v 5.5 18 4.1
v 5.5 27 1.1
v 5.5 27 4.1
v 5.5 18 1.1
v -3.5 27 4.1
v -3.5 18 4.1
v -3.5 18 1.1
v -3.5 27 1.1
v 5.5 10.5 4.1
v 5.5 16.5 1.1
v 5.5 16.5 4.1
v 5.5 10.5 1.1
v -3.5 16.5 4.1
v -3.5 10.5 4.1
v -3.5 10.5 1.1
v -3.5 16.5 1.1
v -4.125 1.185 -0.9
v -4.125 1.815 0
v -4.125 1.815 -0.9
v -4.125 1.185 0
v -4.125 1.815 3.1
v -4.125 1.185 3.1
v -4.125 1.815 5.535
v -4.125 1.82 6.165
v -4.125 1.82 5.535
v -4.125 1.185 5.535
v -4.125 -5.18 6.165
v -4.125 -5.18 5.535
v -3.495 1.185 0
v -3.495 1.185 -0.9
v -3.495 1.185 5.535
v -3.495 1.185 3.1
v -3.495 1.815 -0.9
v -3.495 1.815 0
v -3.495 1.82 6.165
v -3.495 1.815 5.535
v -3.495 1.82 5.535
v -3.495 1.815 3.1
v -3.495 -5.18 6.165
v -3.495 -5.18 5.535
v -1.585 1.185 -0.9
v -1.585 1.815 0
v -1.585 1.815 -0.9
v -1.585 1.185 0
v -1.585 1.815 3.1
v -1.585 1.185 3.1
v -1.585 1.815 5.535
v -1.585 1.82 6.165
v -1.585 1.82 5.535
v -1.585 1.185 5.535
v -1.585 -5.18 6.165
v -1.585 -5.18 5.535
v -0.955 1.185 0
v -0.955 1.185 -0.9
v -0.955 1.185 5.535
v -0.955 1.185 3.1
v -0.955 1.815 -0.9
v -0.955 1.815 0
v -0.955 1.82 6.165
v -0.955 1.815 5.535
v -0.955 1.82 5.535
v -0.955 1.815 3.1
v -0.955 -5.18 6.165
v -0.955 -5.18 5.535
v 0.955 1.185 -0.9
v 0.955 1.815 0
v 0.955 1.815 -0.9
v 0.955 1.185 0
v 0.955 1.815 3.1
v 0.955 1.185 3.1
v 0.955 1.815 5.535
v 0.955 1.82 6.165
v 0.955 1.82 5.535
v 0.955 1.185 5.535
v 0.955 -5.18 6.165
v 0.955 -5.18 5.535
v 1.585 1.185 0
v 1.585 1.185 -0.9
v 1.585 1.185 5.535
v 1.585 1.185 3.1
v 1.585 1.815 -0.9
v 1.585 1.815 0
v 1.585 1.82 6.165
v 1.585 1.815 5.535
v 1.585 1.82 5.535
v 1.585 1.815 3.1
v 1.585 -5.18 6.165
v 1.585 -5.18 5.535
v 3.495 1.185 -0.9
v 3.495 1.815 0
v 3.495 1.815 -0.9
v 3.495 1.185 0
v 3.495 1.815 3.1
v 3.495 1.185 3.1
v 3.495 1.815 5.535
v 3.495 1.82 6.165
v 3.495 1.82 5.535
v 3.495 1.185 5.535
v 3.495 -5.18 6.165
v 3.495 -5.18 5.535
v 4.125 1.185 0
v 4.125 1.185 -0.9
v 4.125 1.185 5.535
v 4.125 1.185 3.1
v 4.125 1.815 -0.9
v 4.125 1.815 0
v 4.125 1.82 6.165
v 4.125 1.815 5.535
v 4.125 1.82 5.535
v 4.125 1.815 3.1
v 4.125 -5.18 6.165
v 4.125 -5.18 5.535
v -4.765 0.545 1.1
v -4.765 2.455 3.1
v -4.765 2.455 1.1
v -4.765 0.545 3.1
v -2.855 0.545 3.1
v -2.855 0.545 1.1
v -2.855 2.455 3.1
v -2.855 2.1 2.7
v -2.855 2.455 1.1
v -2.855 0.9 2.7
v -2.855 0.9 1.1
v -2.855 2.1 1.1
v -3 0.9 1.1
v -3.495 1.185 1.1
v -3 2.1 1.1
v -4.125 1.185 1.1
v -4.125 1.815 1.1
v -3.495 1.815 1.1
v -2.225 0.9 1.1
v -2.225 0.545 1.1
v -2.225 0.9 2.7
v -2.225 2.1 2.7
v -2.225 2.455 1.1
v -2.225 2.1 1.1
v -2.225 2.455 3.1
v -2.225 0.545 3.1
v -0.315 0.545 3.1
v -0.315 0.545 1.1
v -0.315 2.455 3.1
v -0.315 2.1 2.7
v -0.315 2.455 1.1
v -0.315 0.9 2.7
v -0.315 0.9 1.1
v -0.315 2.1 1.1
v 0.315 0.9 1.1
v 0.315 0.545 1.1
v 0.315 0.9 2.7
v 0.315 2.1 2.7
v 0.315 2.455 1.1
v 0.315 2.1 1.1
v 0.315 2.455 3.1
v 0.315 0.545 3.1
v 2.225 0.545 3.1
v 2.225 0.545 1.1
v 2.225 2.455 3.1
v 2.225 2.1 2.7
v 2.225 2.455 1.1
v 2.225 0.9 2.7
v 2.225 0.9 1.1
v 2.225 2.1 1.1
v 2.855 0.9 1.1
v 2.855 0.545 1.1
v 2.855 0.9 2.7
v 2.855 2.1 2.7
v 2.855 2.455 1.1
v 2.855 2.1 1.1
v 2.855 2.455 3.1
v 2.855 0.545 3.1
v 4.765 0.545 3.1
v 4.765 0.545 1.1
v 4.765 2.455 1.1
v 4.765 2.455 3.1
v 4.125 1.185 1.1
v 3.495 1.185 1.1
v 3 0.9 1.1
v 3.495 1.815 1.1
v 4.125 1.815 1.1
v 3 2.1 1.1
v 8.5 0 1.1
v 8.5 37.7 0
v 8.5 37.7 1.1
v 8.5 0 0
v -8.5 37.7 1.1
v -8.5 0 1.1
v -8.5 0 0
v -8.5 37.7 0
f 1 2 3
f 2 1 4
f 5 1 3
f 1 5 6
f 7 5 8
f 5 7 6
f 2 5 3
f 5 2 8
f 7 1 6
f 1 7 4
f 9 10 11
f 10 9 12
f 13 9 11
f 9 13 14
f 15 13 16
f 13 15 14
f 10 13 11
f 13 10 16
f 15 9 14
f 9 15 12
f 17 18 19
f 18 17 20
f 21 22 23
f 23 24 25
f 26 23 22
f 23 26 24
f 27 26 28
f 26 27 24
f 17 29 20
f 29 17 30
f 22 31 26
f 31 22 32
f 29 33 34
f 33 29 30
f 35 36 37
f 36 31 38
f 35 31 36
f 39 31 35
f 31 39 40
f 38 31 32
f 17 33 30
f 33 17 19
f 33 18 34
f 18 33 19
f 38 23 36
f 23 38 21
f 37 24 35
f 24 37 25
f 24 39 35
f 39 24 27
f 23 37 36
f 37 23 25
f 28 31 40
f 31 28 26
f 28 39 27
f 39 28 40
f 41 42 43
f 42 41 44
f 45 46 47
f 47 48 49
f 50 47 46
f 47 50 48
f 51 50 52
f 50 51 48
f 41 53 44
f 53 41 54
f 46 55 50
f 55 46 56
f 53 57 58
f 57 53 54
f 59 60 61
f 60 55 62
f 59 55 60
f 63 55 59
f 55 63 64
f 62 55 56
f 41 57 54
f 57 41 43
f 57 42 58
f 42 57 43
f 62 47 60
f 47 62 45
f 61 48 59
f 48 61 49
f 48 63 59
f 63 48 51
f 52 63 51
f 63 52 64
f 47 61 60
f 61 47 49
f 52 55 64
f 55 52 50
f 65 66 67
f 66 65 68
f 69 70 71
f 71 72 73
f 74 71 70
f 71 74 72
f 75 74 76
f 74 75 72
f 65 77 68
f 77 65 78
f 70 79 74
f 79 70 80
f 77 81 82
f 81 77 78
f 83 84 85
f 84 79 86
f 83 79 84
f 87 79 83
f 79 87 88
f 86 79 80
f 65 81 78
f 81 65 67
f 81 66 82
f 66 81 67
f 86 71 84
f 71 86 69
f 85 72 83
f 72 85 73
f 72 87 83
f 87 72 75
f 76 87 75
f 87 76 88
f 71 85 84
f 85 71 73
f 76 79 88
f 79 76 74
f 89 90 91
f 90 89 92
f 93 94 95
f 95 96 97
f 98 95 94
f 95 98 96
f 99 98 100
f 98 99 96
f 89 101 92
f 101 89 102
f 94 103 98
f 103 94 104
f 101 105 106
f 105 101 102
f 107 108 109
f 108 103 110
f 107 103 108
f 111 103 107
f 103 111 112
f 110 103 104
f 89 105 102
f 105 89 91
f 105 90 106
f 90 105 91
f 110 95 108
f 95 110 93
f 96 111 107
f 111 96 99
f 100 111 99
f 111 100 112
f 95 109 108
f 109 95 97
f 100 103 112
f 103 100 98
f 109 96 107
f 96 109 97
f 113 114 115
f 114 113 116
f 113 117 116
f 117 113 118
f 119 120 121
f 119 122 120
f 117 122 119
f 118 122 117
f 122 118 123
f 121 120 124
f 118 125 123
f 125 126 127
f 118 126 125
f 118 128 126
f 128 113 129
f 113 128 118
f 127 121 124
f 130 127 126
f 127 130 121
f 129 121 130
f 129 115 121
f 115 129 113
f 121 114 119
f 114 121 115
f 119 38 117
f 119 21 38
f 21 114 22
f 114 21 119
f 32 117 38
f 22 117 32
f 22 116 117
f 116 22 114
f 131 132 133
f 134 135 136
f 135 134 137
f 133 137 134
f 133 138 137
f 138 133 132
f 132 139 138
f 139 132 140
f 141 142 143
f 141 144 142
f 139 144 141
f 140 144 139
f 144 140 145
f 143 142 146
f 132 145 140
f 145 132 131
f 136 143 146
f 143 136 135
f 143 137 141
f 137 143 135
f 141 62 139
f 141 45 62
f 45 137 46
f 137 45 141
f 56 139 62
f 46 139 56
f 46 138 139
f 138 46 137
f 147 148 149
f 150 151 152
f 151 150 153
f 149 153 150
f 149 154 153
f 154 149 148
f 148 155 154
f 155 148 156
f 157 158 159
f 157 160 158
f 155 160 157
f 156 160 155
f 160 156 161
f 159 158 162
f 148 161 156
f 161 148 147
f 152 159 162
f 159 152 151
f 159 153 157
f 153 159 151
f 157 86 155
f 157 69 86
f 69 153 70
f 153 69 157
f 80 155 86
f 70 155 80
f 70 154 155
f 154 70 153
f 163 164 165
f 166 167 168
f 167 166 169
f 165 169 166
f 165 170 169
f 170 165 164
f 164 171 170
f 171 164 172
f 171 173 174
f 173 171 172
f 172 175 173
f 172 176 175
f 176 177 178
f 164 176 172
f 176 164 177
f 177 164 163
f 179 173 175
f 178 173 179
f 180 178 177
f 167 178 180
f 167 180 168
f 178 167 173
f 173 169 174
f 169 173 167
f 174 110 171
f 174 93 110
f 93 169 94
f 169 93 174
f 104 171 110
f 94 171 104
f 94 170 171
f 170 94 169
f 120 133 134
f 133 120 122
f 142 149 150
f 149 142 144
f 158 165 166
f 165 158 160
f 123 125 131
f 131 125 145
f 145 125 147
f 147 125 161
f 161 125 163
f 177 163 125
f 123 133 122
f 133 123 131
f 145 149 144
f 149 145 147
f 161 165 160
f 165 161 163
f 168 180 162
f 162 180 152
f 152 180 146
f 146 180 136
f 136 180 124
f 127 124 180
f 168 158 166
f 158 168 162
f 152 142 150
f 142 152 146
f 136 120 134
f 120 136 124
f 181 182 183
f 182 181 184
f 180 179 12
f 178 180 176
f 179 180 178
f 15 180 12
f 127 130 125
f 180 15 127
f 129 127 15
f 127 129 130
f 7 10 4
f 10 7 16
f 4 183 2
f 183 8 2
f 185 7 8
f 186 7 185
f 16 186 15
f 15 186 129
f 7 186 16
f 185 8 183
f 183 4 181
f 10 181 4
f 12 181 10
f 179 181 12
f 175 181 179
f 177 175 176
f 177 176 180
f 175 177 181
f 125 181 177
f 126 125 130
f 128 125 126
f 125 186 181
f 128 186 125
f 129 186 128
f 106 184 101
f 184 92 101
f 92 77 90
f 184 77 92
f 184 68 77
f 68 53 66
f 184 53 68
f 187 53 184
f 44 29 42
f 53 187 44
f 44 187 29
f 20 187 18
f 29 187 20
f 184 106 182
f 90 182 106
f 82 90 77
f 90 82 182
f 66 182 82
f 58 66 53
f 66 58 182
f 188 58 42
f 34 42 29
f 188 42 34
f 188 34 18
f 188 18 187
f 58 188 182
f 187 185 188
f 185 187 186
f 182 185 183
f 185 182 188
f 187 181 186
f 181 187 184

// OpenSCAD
$fn = 300;

bluetooth ();

module bluetooth () {
    color ([0.1, 0.3, 0.5, 1]) {
        translate ([-8.5, 0, 0]) {
            cube ([17, 37.7, 1.1]);
        }
    }
    color ([0.1, 0.1, 0.1, 1]) {
        translate ([-3.5, 18, 0.5]) {
            cube ([9, 9, 3.6]);
        }
        translate ([-3.5, 10.5, 0.5]) {
            cube ([9, 6, 3.6]);
        }
    }
    translate ([0, 1.5, 1.1])
    rotate ([180, 0, 0]) {
        for (i = [0: 2.54: 2.54 * 3]) {
            color ([0.8, 0.8, 0.8, 1]) {
                translate ([i - 2.54 * 1.5, 0, -4.75]) {
                    rotate ([0, 0, 45]) {
                        cylinder (h = 6.75, d = 0.63 * sqrt (2),
                                  $fn = 4);
                    }
                    translate ([0, -0.32, 0]) {
                        rotate ([270, 45, 0]) {
                            cylinder (h = 7, d = 0.63 * sqrt (2),
                                      $fn = 4);
                        }
                    }
                }
            }
            color ([0.1, 0.1, 0.1, 1]) {
                translate ([i - 2.54 * 1.5, 0, -2]) {
                    rotate ([0, 0, 45]) {
                        cylinder (h = 2, d = 2.7, $fn = 4);
                    }
                }
            }
        }
        color ([0.1, 0.1, 0.1, 1]) {
            translate ([-3, -0.6, -1.6]) {
                cube ([6, 1.2, 2]);
            }
        }
    }
}
